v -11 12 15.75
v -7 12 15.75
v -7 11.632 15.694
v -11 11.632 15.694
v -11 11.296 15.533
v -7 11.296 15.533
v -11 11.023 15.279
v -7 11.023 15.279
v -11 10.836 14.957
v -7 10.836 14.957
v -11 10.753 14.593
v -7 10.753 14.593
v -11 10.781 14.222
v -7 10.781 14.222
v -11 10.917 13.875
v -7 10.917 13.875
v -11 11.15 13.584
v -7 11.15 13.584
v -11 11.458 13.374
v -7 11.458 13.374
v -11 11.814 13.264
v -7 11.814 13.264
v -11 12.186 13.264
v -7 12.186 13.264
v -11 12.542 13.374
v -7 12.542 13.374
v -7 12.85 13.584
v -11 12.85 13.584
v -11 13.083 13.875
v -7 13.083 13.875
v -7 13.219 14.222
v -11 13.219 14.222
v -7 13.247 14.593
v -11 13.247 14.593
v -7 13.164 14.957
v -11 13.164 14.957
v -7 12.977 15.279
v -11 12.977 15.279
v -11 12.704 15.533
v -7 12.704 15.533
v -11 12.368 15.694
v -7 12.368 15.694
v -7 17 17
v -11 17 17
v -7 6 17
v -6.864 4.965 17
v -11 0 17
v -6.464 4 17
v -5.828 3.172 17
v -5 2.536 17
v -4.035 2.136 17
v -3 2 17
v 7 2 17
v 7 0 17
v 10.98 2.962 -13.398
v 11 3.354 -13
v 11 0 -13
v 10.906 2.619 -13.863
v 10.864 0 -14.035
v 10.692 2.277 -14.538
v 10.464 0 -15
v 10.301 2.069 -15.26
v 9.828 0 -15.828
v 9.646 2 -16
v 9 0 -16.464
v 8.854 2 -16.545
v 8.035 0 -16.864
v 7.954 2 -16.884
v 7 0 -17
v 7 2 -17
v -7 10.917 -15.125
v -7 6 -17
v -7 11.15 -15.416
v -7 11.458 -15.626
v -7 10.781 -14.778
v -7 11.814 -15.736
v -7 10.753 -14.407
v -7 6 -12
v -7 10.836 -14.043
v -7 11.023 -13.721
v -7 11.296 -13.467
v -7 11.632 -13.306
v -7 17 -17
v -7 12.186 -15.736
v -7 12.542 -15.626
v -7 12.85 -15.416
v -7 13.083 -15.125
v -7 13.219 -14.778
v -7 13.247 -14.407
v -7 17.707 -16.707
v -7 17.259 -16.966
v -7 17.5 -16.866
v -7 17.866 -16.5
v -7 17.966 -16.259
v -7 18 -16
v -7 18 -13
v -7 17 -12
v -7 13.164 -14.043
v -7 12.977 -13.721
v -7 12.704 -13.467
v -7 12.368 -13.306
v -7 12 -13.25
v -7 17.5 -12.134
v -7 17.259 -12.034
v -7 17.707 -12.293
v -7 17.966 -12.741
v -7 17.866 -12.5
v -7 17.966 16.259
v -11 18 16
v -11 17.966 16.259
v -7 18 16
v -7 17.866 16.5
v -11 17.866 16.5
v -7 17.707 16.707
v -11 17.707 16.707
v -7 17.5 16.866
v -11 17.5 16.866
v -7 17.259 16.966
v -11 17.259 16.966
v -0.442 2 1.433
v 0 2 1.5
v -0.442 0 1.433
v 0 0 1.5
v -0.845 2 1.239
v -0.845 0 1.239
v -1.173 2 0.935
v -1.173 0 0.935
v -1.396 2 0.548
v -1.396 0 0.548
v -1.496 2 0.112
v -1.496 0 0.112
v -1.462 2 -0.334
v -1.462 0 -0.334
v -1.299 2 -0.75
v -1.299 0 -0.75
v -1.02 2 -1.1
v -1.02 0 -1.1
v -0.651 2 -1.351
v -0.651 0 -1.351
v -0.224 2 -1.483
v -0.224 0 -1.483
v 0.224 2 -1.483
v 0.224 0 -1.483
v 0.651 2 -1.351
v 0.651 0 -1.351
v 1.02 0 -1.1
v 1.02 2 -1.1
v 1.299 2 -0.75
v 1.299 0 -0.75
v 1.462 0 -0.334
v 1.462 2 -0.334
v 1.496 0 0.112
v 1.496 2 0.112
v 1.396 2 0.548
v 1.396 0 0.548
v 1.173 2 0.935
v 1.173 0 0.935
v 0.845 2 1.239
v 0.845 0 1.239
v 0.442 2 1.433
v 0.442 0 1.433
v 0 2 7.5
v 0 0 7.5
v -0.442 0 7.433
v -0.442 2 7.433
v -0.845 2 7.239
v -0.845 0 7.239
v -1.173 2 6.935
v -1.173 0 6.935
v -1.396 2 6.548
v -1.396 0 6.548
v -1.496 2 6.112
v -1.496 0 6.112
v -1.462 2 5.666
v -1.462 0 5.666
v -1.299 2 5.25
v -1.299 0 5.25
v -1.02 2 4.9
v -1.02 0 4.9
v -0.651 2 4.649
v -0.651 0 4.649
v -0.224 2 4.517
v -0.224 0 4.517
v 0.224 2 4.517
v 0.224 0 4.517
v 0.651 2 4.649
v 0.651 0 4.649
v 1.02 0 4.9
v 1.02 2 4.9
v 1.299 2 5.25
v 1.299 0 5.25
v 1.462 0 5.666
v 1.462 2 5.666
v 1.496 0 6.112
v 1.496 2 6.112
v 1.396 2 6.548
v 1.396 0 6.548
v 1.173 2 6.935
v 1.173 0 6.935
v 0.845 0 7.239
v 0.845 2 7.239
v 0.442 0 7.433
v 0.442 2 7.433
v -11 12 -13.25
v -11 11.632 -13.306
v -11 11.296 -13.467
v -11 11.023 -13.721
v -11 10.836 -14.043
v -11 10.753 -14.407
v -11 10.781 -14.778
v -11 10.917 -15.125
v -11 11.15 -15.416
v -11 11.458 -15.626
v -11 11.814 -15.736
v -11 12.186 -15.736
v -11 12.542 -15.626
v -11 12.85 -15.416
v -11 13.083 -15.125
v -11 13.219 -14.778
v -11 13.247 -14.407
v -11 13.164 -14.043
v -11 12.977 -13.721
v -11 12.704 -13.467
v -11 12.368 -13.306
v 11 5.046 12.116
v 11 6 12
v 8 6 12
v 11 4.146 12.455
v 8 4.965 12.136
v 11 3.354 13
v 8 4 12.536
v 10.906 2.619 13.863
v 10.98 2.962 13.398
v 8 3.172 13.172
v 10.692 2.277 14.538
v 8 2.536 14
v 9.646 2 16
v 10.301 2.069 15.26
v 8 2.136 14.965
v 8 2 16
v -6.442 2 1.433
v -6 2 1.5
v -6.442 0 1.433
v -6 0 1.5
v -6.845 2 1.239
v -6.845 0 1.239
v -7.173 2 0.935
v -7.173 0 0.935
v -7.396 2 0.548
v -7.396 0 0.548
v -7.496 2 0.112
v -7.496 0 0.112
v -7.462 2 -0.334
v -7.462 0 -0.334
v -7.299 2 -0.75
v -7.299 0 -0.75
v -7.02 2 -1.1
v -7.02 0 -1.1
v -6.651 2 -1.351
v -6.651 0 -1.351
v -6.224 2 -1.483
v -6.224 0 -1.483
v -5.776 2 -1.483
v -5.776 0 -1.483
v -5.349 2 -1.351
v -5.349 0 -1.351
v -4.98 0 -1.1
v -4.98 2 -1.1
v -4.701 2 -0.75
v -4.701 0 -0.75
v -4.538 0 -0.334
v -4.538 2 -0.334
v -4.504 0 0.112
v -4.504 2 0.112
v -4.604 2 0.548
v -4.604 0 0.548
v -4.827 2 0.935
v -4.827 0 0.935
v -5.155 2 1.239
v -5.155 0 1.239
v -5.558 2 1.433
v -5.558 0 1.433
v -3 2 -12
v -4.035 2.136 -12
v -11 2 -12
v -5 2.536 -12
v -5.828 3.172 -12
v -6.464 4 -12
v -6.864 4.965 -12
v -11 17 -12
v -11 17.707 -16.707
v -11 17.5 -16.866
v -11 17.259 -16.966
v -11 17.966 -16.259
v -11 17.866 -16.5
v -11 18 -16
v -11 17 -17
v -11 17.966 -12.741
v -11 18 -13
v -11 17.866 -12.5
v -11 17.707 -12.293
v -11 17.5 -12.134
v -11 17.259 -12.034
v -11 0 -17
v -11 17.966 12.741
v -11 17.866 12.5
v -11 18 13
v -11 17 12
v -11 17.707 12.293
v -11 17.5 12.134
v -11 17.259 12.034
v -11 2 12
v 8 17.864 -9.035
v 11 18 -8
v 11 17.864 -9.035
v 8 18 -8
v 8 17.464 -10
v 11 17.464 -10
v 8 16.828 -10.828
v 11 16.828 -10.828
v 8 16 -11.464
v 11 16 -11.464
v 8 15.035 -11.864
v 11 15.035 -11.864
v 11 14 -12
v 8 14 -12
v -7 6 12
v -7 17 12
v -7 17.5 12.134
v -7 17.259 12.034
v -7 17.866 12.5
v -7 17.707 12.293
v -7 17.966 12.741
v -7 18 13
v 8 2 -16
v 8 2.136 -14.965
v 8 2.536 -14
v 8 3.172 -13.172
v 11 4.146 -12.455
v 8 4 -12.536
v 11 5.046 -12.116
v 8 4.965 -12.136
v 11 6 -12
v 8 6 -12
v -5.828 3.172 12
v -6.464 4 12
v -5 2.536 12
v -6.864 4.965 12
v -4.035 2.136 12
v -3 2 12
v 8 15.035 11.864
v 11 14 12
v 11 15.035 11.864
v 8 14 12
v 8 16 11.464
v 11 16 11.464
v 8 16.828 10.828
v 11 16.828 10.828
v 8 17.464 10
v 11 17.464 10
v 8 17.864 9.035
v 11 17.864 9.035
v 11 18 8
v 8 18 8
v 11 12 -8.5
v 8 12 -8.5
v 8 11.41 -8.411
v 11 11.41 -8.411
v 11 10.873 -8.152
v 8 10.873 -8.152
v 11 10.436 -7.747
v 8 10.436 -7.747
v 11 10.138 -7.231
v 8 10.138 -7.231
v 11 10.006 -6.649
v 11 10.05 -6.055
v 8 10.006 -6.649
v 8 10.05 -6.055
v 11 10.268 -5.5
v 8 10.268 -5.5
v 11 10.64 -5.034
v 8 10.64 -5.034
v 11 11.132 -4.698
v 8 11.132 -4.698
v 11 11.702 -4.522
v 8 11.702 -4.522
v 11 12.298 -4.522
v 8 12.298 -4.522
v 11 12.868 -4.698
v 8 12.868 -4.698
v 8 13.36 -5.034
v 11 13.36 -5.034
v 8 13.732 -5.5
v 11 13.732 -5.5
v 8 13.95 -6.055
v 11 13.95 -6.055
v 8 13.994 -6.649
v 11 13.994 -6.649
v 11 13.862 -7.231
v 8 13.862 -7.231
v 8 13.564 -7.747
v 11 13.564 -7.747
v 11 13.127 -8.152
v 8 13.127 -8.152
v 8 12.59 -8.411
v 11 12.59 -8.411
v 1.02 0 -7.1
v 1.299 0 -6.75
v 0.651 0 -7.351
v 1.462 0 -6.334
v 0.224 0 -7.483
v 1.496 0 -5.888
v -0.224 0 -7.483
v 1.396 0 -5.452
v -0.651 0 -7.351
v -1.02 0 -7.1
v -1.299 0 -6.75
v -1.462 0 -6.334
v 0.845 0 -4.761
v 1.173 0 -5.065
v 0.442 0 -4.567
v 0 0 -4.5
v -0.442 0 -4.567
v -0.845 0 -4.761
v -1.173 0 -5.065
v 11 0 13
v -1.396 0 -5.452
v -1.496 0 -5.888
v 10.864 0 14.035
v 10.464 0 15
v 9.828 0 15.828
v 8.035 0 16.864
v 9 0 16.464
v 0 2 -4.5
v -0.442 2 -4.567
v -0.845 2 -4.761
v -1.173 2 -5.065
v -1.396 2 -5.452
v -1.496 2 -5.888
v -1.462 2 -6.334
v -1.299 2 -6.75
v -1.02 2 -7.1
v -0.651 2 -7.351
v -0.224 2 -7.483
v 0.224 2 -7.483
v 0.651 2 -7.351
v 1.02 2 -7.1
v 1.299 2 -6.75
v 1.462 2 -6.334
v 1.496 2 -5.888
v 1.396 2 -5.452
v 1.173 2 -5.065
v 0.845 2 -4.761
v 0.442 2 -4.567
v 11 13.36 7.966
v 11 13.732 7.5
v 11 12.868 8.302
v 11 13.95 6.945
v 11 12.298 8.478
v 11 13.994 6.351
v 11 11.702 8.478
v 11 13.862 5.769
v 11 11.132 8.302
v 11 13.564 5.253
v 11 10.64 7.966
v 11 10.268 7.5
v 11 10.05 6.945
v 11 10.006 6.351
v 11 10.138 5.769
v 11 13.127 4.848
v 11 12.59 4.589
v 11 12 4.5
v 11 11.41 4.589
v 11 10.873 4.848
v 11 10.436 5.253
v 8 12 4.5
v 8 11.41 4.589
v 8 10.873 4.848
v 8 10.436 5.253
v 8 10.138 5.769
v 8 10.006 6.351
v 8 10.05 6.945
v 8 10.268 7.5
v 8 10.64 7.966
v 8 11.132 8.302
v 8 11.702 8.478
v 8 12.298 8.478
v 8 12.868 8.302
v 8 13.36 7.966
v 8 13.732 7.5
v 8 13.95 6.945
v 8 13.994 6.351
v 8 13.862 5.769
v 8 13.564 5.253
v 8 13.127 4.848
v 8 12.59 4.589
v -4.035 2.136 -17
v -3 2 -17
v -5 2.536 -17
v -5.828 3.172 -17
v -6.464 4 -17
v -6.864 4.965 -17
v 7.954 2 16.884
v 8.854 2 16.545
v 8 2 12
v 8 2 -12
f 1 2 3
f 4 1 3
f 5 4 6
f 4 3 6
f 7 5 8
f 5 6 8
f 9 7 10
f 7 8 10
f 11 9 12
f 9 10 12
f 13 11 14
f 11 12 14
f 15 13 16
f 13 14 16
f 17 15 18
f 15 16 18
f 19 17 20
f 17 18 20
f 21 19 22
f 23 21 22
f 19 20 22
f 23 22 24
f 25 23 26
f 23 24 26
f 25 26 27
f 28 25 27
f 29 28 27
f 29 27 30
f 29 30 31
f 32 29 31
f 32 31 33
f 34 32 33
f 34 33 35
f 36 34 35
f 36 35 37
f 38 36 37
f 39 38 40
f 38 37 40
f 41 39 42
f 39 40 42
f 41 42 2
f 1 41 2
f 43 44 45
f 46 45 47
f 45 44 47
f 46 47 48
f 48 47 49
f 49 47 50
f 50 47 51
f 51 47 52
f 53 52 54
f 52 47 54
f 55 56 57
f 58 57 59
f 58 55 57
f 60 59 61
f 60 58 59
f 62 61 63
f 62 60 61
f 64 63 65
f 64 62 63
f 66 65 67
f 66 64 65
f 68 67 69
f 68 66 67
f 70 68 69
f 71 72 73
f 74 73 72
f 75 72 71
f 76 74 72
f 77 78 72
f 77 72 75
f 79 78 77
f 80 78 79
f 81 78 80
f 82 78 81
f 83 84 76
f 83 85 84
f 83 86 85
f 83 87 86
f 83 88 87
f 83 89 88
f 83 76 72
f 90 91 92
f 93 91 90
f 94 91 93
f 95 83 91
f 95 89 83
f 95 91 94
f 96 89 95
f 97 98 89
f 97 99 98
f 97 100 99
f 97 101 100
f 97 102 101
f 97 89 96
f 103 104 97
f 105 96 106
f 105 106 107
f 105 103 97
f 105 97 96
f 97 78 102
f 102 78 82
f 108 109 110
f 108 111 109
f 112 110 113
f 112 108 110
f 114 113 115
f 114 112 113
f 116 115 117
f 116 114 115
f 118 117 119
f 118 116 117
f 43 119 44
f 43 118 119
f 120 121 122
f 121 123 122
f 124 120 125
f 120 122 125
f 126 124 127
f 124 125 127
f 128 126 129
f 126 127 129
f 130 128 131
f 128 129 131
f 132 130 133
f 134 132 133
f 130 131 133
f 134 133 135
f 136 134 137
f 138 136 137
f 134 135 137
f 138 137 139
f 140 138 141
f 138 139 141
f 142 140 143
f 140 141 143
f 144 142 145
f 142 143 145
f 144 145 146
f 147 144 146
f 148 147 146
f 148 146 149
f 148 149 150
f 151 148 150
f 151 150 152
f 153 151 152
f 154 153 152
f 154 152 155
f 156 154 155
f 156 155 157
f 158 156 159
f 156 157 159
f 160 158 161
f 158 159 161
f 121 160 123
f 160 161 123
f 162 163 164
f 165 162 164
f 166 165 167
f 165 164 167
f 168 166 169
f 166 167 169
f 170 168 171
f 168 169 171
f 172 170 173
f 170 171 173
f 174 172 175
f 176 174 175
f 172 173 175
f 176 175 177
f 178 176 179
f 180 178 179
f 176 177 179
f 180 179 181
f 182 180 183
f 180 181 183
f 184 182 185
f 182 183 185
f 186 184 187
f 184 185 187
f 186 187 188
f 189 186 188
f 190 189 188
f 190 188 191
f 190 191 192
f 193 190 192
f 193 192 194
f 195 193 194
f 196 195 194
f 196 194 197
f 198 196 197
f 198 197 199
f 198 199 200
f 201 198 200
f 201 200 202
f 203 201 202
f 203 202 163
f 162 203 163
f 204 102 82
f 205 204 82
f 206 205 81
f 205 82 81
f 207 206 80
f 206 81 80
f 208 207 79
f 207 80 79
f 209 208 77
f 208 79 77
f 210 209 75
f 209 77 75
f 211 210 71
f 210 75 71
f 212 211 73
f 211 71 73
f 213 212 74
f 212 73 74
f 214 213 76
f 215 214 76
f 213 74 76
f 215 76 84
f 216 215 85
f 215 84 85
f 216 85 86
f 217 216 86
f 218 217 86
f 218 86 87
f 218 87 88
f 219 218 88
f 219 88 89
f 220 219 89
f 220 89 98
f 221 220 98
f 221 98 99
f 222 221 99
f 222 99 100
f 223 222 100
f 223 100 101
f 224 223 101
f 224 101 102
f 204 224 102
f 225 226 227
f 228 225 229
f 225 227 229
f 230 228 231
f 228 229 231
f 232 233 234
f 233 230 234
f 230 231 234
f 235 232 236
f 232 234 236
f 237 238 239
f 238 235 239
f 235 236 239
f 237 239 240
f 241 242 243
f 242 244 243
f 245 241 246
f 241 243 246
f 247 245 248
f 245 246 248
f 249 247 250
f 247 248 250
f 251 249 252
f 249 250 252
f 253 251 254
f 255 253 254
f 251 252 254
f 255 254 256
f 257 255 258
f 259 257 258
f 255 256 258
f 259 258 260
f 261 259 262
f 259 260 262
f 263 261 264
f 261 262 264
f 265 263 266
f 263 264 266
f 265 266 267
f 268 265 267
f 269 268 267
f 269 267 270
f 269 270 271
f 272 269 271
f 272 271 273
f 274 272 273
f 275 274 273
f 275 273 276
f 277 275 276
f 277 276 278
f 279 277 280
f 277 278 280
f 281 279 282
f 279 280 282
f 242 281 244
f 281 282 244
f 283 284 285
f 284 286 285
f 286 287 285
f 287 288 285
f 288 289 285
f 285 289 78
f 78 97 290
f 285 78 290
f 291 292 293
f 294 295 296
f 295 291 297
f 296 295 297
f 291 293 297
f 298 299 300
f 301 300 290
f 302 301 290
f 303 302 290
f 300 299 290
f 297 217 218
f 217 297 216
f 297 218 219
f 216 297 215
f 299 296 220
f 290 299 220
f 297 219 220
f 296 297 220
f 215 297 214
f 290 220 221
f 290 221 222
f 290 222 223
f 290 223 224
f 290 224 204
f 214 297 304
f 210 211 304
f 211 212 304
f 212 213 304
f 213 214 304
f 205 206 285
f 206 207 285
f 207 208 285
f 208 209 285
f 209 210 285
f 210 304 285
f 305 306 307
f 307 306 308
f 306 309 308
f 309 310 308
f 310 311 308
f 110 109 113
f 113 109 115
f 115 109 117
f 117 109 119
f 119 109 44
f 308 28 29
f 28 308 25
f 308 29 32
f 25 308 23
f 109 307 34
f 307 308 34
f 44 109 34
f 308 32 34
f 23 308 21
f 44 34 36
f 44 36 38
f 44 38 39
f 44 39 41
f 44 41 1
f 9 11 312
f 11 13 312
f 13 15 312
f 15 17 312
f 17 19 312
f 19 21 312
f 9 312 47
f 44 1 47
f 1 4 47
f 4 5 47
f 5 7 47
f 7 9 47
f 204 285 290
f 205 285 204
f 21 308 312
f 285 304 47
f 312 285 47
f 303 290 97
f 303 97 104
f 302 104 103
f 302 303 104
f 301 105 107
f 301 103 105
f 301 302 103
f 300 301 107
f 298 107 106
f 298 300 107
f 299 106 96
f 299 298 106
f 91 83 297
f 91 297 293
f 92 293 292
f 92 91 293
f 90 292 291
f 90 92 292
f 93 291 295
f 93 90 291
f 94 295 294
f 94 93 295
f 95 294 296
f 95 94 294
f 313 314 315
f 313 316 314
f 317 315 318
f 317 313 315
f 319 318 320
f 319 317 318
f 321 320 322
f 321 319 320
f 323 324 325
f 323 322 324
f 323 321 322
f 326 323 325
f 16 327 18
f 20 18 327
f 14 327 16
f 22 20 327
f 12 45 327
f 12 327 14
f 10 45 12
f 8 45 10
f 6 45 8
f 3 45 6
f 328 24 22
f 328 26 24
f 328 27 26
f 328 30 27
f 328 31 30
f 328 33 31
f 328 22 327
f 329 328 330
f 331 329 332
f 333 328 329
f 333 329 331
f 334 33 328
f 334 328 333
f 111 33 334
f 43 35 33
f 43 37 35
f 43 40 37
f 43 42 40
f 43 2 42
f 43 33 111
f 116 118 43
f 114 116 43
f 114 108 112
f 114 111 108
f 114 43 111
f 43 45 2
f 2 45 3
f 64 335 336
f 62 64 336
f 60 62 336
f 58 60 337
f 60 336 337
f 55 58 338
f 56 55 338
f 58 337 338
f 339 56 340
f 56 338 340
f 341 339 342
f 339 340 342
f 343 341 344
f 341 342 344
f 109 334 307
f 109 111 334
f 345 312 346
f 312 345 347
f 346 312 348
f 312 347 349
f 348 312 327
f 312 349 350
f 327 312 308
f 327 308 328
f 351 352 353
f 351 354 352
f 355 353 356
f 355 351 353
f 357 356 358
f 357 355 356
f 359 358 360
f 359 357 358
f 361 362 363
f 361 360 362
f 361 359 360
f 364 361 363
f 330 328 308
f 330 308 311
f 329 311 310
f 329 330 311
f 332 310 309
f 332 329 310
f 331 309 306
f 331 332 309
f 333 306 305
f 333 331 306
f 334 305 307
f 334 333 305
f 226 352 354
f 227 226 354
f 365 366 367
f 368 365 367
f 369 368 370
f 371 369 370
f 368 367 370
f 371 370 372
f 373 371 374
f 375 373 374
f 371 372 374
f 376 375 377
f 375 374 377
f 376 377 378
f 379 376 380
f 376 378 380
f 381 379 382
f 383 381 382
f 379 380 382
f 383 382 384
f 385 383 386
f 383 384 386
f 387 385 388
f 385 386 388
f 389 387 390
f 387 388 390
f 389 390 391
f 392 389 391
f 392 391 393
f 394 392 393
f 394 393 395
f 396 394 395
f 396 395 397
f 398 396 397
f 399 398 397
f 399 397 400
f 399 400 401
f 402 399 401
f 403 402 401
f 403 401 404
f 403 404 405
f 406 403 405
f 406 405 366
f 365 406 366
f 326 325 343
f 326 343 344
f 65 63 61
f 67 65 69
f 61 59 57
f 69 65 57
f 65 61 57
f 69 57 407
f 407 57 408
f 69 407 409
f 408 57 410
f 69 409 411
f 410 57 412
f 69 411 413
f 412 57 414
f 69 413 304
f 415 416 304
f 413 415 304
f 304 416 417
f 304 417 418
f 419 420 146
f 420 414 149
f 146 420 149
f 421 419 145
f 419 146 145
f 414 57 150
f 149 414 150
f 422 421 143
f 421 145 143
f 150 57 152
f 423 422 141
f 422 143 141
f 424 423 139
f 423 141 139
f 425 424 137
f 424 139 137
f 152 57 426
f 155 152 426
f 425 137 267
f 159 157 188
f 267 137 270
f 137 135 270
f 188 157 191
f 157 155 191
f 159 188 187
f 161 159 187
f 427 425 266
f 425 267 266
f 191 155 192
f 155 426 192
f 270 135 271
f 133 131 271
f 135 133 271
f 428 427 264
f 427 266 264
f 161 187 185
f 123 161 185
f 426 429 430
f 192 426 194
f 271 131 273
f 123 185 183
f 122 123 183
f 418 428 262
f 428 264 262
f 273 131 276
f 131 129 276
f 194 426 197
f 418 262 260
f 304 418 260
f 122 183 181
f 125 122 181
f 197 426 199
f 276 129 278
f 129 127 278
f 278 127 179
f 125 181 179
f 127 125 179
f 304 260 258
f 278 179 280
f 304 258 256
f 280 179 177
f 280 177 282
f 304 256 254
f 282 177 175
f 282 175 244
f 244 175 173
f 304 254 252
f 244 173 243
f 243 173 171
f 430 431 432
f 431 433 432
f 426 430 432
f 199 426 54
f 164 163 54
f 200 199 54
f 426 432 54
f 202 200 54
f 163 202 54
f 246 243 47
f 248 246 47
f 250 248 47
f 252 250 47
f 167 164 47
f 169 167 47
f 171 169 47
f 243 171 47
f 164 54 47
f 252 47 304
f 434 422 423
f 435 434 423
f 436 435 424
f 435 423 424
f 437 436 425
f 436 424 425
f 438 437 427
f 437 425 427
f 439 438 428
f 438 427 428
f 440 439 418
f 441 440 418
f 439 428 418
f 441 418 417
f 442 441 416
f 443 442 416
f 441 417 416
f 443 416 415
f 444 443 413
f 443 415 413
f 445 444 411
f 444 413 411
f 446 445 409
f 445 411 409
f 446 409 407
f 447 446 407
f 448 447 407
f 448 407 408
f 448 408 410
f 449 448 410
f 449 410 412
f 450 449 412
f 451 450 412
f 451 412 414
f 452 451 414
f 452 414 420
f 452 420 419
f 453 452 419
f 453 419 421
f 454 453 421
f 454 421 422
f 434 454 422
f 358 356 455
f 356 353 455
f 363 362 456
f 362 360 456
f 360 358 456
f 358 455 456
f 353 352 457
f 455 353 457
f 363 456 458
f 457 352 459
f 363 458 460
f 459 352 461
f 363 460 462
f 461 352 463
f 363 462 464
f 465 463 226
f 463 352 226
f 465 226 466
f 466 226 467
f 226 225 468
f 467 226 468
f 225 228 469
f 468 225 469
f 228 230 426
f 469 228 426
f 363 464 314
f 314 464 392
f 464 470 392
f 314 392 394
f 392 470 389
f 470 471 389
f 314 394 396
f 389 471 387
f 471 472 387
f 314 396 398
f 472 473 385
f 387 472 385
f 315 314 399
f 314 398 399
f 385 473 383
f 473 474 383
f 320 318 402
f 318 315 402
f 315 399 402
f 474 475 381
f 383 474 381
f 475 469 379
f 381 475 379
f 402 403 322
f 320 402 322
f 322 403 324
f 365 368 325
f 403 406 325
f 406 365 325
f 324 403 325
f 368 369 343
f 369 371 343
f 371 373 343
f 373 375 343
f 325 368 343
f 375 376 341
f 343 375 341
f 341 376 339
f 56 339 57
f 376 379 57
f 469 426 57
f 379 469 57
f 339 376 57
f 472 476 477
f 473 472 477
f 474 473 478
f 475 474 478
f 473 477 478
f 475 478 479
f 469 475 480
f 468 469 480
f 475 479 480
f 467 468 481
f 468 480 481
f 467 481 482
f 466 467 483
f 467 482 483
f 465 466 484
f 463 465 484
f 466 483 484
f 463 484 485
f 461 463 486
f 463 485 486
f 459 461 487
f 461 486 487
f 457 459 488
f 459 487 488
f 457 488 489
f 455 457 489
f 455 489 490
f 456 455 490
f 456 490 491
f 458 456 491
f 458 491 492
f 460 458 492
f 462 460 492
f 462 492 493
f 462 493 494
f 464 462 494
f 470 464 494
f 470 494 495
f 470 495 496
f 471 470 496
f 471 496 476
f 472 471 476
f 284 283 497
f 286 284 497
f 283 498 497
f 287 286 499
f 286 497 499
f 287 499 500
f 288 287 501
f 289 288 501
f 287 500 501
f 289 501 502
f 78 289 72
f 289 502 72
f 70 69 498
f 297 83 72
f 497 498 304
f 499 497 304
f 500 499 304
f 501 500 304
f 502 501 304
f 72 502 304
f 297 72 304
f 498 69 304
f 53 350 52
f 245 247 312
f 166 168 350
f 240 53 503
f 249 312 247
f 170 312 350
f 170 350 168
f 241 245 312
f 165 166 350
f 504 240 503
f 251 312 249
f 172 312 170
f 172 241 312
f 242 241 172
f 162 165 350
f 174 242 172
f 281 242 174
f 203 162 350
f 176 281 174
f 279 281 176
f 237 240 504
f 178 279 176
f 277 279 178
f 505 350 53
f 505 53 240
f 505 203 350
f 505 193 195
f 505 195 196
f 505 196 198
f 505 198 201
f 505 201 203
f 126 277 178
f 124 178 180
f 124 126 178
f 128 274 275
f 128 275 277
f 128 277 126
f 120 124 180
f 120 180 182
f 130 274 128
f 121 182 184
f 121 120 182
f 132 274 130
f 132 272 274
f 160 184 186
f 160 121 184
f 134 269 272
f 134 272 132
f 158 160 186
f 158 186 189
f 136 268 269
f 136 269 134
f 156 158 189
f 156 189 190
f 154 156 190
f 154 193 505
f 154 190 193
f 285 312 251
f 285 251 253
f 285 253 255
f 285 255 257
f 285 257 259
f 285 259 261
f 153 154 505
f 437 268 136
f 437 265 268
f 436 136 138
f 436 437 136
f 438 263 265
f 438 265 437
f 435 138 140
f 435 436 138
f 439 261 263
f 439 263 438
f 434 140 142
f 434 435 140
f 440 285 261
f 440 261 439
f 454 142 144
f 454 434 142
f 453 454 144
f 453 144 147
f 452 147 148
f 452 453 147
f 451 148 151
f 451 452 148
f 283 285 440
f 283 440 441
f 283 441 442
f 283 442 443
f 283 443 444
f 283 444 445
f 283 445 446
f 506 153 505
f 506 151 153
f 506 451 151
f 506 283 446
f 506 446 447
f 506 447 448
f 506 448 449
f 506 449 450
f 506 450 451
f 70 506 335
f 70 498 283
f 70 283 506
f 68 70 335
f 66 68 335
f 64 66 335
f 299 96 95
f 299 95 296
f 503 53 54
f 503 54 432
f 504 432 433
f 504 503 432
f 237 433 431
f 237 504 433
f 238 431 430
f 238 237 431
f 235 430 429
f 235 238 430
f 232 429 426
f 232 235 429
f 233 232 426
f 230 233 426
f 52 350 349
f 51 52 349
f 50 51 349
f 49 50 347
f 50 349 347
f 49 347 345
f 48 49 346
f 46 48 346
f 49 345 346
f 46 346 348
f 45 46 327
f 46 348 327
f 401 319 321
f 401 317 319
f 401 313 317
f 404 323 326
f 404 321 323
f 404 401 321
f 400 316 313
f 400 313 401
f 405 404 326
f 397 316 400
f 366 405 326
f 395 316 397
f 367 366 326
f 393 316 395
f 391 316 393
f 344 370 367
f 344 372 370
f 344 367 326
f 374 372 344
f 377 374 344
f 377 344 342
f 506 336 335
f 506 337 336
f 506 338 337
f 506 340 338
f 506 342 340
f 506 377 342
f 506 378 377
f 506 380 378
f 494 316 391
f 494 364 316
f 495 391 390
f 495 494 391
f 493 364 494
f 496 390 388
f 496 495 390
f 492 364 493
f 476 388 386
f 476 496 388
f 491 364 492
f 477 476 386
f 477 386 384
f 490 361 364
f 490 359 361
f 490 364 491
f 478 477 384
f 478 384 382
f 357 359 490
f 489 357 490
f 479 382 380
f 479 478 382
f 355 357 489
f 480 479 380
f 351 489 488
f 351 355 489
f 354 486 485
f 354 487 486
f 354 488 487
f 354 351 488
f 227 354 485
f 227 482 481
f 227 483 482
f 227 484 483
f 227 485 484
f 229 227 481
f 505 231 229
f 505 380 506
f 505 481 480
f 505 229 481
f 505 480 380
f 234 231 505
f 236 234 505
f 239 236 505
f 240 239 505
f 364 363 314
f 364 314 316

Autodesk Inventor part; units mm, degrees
ref_plane "YZ Plane" through (0, 0, 0) normal (1, 0, 0) x (0, 1, 0)
ref_plane "XZ Plane" through (0, 0, 0) normal (0, 1, 0) x (-1, 0, 0)
ref_plane "XY Plane" through (0, 0, 0) normal (0, 0, 1) x (1, 0, 0)
sketch "Sketch1" plane through (0, 0, 0) normal (0, 1, 0) x (-1, 0, 0)
  line L0 (15.4, 0) -> (-15.4, 0) projected
  line L1 (0, -23.8) -> (0, 23.8) projected
  line L2 (11, 17) -> (-11, 17)
  line L3 (-11, 17) -> (-11, -17)
  line L4 (-11, -17) -> (11, -17)
  line L5 (11, -17) -> (11, 17)
  point P0 (0, 0)
  dimension "d0" = 22
  dimension "d1" = 34
extrude "Extrusion1" add sketch "Sketch1" along normal blind 18
sketch "Sketch2" plane through (0, 18, 0) normal (0, 1, 0) x (1, 0, 0)
  line L0 (-11, -12) -> (8, -12)
  line L1 (8, -12) -> (8, 12)
  line L2 (8, 12) -> (-11, 12)
  line L3 (-11, 12) -> (-11, -12)
  line L4 (-11, -17) -> (11, -17) projected
  line L5 (11, -17) -> (11, 17) projected
  line L6 (11, 17) -> (-11, 17) projected
  line L7 (-11, 17) -> (-11, -17) projected
  line L8 (-15.4, 0) -> (15.4, 0) projected
  point P0 (0, 0)
  dimension "d5" = 24
  dimension "d6" = 3
extrude "Extrusion2" cut sketch "Sketch2" against normal blind 16 contours L3 L8 L1 L0 | L3 L2 L1 L8
sketch "Sketch3" plane through (-11, 0, 17) normal (0, 0, 1) x (1, 0, 0)
  line L0 (4, 18) -> (19, 18)
  line L1 (19, 18) -> (19, 2)
  line L2 (19, 2) -> (4, 2)
  line L3 (4, 2) -> (4, 18)
  line L4 (0, 18) -> (22, 18) projected
  line L5 (0, 0) -> (0, 18) projected
  line L6 (22, 0) -> (22, 18) projected
  line L7 (0, 0) -> (22, 0) projected
  point P0 (11, 0)
  dimension "d9" = 4
  dimension "d10" = 3
  dimension "d11" = 2
extrude "Extrusion3" cut sketch "Sketch3" against normal through all contours L0 L1 L2 L3
sketch "Sketch6" plane through (0, 2, 0) normal (0, 1, 0) x (1, 0, 0)
  line L0 (-11, 12) -> (-7, 12) projected
  line L1 (-11, -12) -> (-11, 12) projected
  line L2 (-7, -12) -> (-11, -12) projected
  line L3 (-7, -17) -> (-7, -12) projected
  line L4 (8, -17) -> (-7, -17) projected
  line L5 (-7, 17) -> (8, 17) projected
  line L6 (-7, 12) -> (-7, 17) projected
  line L7 (-15.4, 0) -> (15.4, 0) projected
  line L8 (0, 23.8) -> (0, -23.8) projected
  line L9 (8, -17) -> (8, 17) projected
  point P0 (0, 0)
  point P1 (0, 0)
  point P2 (0, 6)
  point P3 (0, -6)
  point P4 (-6, 0)
  dimension "d15" = 6
  dimension "d16" = 6
  dimension "d18" = 6
hole "Hole1" at (0, 2, -6) at (0, 2, 0) at (0, 2, 6) at (-6, 2, 0) direction (0, -1, 0) diameter 3 end through all
sketch "Sketch8" plane through (11, 0, 17) normal (1, 0, 0) x (0, 0, -1)
  line L0 (0, 0) -> (34, 0) projected
  line L1 (34, 0) -> (34, 18) projected
  line L2 (0, 18) -> (34, 18) projected
  line L3 (0, 0) -> (0, 18) projected
  line L4 (29, 2) -> (29, 18) projected
  line L5 (5, 18) -> (5, 2) projected
  line L6 (29, 2) -> (5, 2) projected
  point P0 (17, 0)
  point P1 (0, 2)
  point P2 (34, 2)
  point P3 (23.5, 12)
  point P4 (10.5, 12)
  dimension "d28" = 5.5
  dimension "d29" = 5.5
  dimension "d30" = 6
  dimension "d31" = 6
hole "Hole2" at (11, 12, -6.5) at (11, 12, 6.5) direction (-1, 0, 0) diameter 4 end through all
sketch "Sketch9" plane through (-11, 0, -17) normal (-1, 0, 0) x (0, 0, 1)
  line L0 (29, 18) -> (29, 2) projected
  line L1 (29, 2) -> (5, 2) projected
  line L2 (5, 2) -> (5, 18) projected
  line L3 (0, 18) -> (5, 18) projected
  line L4 (0, 0) -> (0, 18) projected
  line L5 (0, 0) -> (34, 0) projected
  line L6 (34, 0) -> (34, 18) projected
  line L7 (29, 18) -> (34, 18) projected
  point P0 (17, 0)
  point P1 (2.5, 12)
  point P2 (31.5, 12)
  dimension "d39" = 6
  dimension "d40" = 6
  dimension "d41" = 2.5
  dimension "d42" = 2.5
hole "Hole3" at (-11, 12, -14.5) at (-11, 12, 14.5) direction (1, 0, 0) diameter 2.5 depth 19
fillet "Fillet2" radius 1 4 edges at (-9, 18, 17) (-9, 18, -17) (-9, 18, -12) (-9, 18, 12)
fillet "Fillet4" radius 4 2 edges at (-7, 2, -14.5) (-7, 2, 14.5)
sketch "Sketch12" plane through (0, 18, 0) normal (0, 1, 0) x (1, 0, 0)
  line L0 (8, 17) -> (8, -17) projected
  line L1 (8, -17) -> (11, -17) projected
  line L2 (11, -17) -> (11, 17) projected
  line L3 (11, 17) -> (8, 17) projected
  line L4 (8, -17) -> (11, -17)
  line L5 (11, -17) -> (11, -12)
  line L6 (11, -12) -> (8, -12)
  line L7 (8, -12) -> (8, -17)
  line L8 (8, 17) -> (11, 17)
  line L9 (11, 17) -> (11, 12)
  line L10 (11, 12) -> (8, 12)
  line L11 (8, 12) -> (8, 17)
  line L12 (-11, 12) -> (-7, 12) projected
  line L13 (-7, -12) -> (-11, -12) projected
  point P0 (0, 0)
extrude "Extrusion5" cut sketch "Sketch12" against normal blind 16 contours L3 L2 L10 L0 | L6 L2 L1 L0
fillet "Fillet5" radius 4 4 edges at (9.5, 18, 12) (9.5, 18, -12) (11, 1, 17) (11, 1, -17)
fillet "Fillet6" radius 4 2 edges at (9.5, 2, -12) (9.5, 2, 12)
properties part number "bracket"
